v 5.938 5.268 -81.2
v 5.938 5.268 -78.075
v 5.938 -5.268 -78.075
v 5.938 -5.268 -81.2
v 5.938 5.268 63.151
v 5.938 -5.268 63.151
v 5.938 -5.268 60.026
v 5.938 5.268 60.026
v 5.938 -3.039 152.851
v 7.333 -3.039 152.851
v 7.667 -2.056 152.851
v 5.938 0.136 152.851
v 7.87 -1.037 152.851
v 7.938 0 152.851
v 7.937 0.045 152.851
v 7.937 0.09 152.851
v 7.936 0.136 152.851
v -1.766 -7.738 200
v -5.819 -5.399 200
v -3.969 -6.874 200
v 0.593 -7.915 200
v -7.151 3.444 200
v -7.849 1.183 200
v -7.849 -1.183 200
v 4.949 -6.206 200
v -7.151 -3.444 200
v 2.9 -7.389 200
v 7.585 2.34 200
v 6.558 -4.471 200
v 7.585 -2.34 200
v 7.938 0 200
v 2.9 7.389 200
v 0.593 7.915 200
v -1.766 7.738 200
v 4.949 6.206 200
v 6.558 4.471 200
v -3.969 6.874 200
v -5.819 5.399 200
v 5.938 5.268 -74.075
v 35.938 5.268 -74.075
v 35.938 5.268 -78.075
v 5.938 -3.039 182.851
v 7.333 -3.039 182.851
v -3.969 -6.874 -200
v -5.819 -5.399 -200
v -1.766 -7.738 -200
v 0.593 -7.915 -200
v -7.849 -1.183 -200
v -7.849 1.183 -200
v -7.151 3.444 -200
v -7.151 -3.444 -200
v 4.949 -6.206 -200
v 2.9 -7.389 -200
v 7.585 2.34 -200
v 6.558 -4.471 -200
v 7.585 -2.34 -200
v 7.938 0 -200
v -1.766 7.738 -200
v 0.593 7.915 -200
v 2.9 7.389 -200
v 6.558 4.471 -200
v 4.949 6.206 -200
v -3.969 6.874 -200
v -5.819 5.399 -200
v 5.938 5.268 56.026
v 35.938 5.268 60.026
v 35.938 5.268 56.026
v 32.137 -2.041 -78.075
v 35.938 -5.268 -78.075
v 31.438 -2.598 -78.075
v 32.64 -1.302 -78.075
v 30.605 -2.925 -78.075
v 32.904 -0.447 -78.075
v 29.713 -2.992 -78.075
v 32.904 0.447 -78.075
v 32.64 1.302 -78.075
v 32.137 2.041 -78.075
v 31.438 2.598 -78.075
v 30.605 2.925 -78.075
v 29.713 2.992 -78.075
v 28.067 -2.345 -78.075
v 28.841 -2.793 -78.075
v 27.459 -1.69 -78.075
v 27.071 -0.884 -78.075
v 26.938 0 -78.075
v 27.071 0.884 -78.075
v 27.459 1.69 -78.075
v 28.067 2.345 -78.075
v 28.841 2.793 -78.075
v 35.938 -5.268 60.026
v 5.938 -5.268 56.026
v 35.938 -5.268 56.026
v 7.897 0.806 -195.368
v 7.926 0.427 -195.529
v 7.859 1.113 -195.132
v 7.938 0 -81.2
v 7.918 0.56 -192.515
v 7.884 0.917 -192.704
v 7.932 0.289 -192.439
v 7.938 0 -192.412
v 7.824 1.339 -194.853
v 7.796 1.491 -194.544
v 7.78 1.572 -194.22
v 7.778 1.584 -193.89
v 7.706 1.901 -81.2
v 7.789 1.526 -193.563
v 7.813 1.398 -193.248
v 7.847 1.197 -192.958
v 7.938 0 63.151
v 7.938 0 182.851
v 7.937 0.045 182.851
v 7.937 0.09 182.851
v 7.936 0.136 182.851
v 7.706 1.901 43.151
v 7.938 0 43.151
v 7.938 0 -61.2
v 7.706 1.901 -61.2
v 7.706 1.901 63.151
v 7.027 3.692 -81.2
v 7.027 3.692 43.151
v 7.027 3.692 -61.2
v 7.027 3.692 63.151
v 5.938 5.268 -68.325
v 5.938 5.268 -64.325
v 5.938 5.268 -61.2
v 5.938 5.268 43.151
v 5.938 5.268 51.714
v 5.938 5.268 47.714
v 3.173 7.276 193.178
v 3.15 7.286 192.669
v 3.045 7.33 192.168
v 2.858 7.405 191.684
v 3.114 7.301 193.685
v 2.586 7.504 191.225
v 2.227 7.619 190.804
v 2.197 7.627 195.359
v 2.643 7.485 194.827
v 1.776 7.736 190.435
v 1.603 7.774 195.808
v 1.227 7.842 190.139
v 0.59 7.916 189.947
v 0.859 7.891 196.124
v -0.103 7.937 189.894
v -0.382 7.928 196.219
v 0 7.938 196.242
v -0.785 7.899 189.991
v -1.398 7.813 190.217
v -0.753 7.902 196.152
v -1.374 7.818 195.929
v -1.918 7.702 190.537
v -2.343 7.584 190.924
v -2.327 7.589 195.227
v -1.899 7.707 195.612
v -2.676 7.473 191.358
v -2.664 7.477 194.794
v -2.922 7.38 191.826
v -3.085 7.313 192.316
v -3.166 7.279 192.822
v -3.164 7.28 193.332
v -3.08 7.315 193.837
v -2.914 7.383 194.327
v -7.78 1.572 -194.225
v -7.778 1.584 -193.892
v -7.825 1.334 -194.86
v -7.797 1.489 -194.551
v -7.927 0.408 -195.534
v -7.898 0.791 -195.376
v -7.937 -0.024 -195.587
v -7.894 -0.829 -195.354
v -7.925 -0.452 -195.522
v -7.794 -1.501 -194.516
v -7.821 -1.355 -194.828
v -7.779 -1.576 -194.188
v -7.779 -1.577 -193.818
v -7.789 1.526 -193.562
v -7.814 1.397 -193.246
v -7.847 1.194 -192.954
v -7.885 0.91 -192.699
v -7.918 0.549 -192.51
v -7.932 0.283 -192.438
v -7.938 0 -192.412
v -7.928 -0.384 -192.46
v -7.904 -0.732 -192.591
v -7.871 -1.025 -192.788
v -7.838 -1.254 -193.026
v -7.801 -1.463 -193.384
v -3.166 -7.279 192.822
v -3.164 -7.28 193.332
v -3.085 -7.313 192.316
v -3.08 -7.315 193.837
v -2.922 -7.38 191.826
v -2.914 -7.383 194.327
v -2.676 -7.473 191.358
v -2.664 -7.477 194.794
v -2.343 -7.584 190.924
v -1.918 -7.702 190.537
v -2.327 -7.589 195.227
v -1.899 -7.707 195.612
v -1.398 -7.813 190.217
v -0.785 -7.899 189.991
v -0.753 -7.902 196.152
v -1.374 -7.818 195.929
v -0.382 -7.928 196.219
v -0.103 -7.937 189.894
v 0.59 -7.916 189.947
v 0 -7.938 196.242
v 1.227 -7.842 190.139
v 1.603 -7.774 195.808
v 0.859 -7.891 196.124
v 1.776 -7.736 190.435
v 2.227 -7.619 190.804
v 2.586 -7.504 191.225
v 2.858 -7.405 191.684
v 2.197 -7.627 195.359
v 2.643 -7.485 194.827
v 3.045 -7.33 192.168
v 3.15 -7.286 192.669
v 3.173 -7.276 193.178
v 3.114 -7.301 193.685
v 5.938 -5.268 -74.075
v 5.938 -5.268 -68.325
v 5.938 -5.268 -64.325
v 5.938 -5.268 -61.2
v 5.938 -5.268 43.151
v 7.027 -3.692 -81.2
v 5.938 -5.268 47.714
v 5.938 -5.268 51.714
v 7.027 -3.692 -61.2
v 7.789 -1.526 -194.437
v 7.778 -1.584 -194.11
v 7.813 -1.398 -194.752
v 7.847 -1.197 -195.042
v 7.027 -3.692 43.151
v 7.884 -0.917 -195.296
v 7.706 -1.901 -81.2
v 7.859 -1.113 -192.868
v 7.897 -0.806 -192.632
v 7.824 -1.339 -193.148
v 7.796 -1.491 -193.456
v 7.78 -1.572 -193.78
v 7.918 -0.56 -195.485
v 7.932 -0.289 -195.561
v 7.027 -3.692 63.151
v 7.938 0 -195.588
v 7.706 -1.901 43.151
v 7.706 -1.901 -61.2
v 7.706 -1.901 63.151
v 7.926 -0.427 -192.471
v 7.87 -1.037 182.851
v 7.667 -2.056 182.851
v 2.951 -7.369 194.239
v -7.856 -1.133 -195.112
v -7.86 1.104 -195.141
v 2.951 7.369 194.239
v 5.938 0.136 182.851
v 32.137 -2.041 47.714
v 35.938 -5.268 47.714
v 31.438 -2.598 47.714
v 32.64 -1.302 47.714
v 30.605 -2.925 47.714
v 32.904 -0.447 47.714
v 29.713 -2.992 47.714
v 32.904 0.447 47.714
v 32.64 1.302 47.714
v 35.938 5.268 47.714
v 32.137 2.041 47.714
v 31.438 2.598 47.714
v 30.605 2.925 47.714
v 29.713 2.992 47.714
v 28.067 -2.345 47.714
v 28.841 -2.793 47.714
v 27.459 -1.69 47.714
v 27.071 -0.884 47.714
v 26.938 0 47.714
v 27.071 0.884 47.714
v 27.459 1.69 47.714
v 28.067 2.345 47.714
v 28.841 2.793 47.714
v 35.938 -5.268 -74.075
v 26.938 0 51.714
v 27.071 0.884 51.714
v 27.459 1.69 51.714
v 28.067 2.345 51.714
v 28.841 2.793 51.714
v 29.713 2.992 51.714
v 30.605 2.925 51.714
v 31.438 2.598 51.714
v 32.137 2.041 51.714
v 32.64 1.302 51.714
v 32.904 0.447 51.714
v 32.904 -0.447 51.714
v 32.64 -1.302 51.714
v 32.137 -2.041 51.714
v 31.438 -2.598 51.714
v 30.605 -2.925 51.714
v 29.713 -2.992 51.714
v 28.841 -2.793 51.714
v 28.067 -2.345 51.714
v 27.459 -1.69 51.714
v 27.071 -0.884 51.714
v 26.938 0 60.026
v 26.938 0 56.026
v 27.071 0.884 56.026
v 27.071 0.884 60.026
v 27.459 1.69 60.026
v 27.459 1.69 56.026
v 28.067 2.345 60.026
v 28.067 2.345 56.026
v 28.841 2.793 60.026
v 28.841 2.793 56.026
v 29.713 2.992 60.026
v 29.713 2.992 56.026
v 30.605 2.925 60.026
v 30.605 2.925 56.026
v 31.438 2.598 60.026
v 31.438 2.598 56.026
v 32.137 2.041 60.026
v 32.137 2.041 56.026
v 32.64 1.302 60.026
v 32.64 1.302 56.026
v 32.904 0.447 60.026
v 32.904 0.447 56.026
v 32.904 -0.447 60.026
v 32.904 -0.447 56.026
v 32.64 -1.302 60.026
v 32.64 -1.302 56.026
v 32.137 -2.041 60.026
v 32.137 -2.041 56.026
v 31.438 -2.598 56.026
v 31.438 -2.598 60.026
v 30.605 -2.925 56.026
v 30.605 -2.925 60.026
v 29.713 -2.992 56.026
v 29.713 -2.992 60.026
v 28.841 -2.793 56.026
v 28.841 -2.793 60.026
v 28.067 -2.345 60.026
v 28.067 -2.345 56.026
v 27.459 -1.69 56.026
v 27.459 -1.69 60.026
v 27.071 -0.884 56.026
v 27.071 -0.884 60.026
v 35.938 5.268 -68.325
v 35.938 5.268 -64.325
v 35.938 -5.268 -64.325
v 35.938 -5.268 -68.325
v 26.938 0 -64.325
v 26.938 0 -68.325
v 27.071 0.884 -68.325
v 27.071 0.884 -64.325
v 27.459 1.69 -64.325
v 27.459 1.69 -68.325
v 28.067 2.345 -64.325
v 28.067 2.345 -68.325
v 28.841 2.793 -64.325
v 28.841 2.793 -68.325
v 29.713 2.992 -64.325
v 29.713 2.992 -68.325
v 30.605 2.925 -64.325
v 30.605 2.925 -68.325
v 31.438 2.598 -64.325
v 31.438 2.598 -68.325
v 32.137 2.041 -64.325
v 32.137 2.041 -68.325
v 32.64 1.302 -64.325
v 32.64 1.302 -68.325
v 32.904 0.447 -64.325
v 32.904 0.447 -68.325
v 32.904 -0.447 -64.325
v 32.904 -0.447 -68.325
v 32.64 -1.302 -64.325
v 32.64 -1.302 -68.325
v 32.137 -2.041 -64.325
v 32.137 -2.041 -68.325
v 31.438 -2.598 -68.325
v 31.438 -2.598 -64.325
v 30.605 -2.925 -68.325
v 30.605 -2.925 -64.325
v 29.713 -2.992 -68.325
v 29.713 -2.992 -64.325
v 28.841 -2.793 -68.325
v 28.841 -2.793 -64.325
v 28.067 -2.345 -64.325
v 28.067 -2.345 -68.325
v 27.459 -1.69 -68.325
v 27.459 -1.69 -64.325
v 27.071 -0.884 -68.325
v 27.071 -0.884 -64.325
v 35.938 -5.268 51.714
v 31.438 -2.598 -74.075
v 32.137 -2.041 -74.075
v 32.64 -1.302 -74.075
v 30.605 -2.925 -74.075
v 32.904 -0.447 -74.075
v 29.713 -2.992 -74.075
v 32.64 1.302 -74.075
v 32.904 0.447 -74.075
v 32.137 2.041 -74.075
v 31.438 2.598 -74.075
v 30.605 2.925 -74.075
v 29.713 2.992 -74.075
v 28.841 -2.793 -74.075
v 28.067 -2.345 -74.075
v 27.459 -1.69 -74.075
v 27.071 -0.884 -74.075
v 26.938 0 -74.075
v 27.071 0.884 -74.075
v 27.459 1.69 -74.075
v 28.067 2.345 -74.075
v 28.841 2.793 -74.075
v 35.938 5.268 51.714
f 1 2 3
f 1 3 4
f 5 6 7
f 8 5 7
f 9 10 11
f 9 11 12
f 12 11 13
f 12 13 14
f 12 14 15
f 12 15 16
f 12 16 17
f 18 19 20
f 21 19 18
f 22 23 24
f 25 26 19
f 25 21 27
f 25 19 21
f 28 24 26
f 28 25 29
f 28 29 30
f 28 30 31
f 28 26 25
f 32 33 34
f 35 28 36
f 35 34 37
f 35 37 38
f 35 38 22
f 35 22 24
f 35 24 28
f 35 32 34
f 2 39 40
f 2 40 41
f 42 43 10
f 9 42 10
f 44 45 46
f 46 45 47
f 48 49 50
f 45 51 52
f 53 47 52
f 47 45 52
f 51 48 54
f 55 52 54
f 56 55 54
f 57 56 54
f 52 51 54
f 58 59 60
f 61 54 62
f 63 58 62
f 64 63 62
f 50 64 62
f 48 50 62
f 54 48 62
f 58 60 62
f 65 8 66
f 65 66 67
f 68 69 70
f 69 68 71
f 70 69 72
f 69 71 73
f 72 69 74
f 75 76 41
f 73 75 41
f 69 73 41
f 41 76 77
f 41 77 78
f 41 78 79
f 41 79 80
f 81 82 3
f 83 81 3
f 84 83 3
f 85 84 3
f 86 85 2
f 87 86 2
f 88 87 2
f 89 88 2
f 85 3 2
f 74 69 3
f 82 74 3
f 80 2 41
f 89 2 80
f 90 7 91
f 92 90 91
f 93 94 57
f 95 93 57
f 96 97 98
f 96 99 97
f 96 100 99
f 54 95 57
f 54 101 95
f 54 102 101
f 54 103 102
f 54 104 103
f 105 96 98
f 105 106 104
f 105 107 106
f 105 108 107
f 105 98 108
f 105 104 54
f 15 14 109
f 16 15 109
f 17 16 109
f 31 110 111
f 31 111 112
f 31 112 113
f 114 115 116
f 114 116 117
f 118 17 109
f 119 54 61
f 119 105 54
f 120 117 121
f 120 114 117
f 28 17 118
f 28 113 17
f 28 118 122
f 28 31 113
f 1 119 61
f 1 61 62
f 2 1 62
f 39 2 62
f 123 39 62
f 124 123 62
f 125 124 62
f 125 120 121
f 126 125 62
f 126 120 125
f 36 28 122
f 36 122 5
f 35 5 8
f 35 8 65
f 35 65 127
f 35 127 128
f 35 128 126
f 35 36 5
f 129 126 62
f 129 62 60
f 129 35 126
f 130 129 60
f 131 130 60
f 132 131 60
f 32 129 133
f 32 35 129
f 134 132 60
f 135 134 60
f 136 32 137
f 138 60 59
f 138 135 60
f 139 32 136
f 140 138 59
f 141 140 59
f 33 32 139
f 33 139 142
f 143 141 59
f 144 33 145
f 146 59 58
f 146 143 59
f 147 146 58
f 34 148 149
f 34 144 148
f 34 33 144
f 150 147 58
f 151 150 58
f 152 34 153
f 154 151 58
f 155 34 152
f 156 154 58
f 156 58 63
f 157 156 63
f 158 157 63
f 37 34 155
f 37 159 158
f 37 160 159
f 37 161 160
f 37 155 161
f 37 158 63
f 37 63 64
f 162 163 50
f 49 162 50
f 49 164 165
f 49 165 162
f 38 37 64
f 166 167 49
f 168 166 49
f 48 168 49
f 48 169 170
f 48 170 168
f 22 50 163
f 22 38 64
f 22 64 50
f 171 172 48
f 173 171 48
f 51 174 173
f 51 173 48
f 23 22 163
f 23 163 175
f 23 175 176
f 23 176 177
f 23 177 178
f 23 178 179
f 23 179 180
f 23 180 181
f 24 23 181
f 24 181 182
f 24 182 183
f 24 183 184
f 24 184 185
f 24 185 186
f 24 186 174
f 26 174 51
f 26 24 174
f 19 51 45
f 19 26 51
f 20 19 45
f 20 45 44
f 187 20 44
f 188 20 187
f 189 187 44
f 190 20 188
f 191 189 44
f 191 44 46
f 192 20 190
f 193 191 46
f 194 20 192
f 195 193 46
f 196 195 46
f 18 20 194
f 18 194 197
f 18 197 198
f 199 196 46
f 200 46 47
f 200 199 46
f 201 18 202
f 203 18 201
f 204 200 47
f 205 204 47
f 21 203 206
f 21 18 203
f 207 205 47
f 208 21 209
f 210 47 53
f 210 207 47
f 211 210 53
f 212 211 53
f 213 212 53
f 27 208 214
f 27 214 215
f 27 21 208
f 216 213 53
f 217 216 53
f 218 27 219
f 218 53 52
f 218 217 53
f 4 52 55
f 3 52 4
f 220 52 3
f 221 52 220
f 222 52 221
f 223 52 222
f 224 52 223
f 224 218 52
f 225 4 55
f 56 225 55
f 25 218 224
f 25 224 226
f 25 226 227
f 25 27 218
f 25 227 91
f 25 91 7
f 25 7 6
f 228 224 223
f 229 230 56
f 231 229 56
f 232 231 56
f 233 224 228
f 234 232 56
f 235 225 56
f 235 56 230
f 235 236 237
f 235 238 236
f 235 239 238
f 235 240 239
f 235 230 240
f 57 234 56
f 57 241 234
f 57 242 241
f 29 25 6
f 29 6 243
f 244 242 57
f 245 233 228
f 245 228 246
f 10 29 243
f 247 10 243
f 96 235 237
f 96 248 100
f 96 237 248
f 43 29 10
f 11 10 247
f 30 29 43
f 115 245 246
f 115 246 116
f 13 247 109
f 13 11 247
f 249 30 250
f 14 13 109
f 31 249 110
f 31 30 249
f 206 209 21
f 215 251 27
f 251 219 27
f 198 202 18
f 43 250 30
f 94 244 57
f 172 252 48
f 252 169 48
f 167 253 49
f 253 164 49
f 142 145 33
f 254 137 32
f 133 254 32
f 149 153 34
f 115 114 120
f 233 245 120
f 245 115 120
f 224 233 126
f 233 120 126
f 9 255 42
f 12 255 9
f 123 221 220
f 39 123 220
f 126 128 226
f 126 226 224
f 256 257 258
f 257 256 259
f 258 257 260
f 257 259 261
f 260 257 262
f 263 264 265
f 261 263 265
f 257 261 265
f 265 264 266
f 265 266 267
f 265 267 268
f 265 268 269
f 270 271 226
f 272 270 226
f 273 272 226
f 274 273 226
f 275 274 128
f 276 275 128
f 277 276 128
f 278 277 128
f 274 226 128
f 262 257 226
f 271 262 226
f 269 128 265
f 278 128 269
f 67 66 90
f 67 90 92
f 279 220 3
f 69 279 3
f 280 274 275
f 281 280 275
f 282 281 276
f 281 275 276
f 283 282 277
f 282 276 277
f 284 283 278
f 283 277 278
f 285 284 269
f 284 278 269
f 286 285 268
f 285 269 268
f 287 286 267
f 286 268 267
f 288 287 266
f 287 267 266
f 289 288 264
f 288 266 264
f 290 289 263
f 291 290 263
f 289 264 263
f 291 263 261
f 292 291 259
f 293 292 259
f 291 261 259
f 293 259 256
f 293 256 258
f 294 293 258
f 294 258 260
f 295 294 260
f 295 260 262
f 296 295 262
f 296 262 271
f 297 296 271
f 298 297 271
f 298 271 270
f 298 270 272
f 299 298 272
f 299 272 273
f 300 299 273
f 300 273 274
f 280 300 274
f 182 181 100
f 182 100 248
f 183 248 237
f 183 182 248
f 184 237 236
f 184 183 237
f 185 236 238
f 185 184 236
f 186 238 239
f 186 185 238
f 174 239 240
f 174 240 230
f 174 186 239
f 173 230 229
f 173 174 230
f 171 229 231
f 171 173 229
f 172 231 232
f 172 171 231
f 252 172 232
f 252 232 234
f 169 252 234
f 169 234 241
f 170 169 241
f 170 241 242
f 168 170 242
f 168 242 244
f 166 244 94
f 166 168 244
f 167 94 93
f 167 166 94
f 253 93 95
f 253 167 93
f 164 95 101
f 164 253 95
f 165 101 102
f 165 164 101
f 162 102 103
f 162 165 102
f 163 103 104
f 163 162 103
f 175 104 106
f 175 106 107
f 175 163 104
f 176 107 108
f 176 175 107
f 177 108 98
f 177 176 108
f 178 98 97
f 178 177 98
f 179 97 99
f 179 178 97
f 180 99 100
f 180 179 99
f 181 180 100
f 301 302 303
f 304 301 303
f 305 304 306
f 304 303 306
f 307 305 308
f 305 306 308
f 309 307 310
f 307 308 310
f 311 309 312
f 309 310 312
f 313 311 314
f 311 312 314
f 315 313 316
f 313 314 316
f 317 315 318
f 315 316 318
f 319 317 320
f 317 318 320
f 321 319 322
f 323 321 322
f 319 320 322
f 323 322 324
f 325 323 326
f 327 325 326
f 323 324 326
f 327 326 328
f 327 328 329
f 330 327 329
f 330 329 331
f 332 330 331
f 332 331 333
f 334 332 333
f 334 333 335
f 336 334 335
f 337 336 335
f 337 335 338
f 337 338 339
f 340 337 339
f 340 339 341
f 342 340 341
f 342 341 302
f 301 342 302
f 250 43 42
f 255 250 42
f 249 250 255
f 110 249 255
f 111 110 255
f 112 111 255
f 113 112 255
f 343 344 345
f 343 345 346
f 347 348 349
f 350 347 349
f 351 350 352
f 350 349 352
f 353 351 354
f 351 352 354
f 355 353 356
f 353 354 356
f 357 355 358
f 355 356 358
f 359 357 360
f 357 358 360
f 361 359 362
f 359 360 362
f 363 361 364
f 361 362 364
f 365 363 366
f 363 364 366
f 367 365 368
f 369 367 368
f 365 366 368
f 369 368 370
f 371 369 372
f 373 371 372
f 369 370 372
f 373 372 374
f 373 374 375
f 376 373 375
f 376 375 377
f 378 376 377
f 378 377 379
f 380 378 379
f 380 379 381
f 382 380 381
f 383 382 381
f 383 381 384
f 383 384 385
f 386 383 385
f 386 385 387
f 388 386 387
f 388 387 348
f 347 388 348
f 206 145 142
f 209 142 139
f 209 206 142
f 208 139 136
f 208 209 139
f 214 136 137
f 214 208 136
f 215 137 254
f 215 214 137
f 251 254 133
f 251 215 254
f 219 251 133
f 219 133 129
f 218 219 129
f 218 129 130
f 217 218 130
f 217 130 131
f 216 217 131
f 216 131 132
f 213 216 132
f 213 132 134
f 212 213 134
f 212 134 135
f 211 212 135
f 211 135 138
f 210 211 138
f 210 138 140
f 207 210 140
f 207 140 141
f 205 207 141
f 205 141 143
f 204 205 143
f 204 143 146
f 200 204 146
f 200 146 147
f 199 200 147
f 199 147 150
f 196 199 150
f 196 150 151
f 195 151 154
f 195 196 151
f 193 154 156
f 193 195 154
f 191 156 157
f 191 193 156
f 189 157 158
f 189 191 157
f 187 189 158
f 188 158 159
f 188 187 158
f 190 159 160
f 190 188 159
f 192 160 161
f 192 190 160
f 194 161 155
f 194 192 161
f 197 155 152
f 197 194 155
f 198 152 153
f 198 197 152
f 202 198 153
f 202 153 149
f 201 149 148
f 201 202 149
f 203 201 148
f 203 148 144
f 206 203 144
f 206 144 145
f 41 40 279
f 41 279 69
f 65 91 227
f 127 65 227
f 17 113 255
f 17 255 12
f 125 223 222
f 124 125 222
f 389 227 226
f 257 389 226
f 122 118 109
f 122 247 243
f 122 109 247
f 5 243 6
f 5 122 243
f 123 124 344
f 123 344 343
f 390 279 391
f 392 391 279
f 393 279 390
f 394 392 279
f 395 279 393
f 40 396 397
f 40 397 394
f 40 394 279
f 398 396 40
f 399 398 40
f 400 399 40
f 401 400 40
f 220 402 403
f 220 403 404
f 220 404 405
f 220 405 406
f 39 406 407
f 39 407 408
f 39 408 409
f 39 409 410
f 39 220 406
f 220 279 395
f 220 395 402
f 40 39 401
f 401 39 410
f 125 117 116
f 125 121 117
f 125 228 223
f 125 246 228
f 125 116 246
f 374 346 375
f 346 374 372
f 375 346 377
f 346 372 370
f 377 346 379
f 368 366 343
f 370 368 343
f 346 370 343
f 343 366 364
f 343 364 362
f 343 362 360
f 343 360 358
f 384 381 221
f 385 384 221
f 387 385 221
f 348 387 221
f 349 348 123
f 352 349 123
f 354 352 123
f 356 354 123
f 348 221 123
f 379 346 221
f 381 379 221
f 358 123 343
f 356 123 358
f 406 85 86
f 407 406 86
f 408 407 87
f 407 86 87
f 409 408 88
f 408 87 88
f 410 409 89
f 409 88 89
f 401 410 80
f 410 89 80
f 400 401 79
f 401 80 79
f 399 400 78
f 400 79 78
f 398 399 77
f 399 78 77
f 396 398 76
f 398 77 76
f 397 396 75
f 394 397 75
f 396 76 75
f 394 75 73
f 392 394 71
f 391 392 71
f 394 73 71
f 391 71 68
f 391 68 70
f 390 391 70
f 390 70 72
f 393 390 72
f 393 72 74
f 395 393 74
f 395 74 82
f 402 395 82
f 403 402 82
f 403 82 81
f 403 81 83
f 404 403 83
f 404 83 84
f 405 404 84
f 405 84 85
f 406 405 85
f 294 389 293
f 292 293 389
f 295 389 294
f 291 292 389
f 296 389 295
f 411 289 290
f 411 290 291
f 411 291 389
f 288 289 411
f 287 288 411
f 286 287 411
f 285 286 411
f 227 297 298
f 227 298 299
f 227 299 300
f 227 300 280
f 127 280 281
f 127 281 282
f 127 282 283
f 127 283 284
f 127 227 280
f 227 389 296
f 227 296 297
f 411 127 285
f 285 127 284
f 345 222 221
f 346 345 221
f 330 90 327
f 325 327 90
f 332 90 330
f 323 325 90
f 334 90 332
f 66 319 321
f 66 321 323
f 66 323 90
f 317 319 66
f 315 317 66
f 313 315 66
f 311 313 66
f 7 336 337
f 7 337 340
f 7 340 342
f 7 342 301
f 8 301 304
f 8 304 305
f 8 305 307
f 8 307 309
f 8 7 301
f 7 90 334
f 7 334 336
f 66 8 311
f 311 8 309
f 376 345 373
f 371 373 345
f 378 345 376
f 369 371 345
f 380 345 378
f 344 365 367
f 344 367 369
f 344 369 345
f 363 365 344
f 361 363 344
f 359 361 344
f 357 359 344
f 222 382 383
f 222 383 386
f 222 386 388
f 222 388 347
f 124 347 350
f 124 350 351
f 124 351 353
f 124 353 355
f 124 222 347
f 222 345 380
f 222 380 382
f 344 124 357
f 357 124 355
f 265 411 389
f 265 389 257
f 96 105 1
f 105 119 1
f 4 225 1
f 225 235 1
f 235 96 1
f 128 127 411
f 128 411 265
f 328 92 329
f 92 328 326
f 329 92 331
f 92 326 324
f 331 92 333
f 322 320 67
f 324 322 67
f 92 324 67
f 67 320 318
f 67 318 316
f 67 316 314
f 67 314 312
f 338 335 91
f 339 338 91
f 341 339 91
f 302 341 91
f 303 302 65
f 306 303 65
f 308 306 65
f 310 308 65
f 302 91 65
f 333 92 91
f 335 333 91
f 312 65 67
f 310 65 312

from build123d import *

# Parameters (mm, degrees)
CROQUIS1_R                 = 7.9375
SALIENTE_EXTRUIR1_DEPTH    = 200
CORTAR_EXTRUIR1_DEPTH      = 16.565810413
CORTAR_EXTRUIR1_DEPTH_BACK = 201.314771828
CROQUIS2_R                 = 1.5875
CORTAR_EXTRUIR2_DEPTH      = 201.314771936
CORTAR_EXTRUIR2_DEPTH_BACK = 16.77901512
CROQUIS3_R                 = 3.175
CROQUIS4_W                 = 20
CROQUIS4_H                 = 19.524905572
CROQUIS4_H_2               = 20.597317053
CROQUIS4_W_2               = 30
CROQUIS4_H_3               = 3.175
CORTAR_EXTRUIR3_DEPTH      = 2
CROQUIS5_W                 = 4
CROQUIS5_H                 = 10.535653752
SALIENTE_EXTRUIR2_DEPTH    = 30
CROQUIS6_R                 = 3
CORTAR_EXTRUIR4_DEPTH      = 232


with BuildPart() as part:
    # Croquis1 → Saliente-Extruir1 (new, symmetric)
    with BuildSketch(Plane.XY):
        Circle(CROQUIS1_R)
    extrude(amount=SALIENTE_EXTRUIR1_DEPTH, both=True)

    # Croquis2 → Cortar-Extruir1 (cut, two sides: drawn at the far end of the back side and taken through both)
    with BuildSketch(Plane(origin=(0, 0, 0), x_dir=(0, 0, -1), z_dir=(1, 0, 0)).offset(-CORTAR_EXTRUIR1_DEPTH_BACK)):
        with Locations((194, 0)):
            Circle(CROQUIS2_R)
    extrude(amount=CORTAR_EXTRUIR1_DEPTH + CORTAR_EXTRUIR1_DEPTH_BACK, mode=Mode.SUBTRACT)

    # Croquis3 → Cortar-Extruir2 (cut, two sides: drawn at the far end of the back side and taken through both)
    with BuildSketch(Plane(origin=(0, 0, 0), x_dir=(1, 0, 0), z_dir=(0, 1, 0)).offset(-CORTAR_EXTRUIR2_DEPTH_BACK)):
        with Locations((0, -193.067059354)):
            Circle(CROQUIS3_R)
    extrude(amount=CORTAR_EXTRUIR2_DEPTH + CORTAR_EXTRUIR2_DEPTH_BACK, mode=Mode.SUBTRACT)

    # Croquis4 → Cortar-Extruir3 (cut)
    with BuildSketch(Plane(origin=(7.9375, 0, 0), x_dir=(0, 0, -1), z_dir=(1, 0, 0))):
        with Locations((71.2, -0.983446493)):
            Rectangle(CROQUIS4_W, CROQUIS4_H)
        with Locations((-53.151122479, -1.451804467)):
            Rectangle(CROQUIS4_W, CROQUIS4_H_2)
        with Locations((-167.851453134, -1.451804466)):
            Rectangle(CROQUIS4_W_2, CROQUIS4_H_3)
    extrude(amount=-CORTAR_EXTRUIR3_DEPTH, mode=Mode.SUBTRACT)

    # Croquis5 → Saliente-Extruir2 (add)
    with BuildSketch(Plane(origin=(5.9375, 0, 0), x_dir=(0, 0, -1), z_dir=(1, 0, 0))):
        with Locations((66.325, 0)):
            Rectangle(CROQUIS5_W, CROQUIS5_H)
        with Locations((76.075, 0)):
            Rectangle(CROQUIS5_W, CROQUIS5_H)
        with Locations((-49.713622479, 0)):
            Rectangle(CROQUIS5_W, CROQUIS5_H)
        with Locations((-58.026122479, 0)):
            Rectangle(CROQUIS5_W, CROQUIS5_H)
    extrude(amount=SALIENTE_EXTRUIR2_DEPTH)

    # Croquis6 → Cortar-Extruir4 (cut)
    with BuildSketch(Plane(origin=(0, 0, -78.075), x_dir=(-1, 0, 0), z_dir=(0, 0, -1))):
        with Locations((-29.9375, 0)):
            Circle(CROQUIS6_R)
    extrude(amount=-CORTAR_EXTRUIR4_DEPTH, mode=Mode.SUBTRACT)


solid = part.part
